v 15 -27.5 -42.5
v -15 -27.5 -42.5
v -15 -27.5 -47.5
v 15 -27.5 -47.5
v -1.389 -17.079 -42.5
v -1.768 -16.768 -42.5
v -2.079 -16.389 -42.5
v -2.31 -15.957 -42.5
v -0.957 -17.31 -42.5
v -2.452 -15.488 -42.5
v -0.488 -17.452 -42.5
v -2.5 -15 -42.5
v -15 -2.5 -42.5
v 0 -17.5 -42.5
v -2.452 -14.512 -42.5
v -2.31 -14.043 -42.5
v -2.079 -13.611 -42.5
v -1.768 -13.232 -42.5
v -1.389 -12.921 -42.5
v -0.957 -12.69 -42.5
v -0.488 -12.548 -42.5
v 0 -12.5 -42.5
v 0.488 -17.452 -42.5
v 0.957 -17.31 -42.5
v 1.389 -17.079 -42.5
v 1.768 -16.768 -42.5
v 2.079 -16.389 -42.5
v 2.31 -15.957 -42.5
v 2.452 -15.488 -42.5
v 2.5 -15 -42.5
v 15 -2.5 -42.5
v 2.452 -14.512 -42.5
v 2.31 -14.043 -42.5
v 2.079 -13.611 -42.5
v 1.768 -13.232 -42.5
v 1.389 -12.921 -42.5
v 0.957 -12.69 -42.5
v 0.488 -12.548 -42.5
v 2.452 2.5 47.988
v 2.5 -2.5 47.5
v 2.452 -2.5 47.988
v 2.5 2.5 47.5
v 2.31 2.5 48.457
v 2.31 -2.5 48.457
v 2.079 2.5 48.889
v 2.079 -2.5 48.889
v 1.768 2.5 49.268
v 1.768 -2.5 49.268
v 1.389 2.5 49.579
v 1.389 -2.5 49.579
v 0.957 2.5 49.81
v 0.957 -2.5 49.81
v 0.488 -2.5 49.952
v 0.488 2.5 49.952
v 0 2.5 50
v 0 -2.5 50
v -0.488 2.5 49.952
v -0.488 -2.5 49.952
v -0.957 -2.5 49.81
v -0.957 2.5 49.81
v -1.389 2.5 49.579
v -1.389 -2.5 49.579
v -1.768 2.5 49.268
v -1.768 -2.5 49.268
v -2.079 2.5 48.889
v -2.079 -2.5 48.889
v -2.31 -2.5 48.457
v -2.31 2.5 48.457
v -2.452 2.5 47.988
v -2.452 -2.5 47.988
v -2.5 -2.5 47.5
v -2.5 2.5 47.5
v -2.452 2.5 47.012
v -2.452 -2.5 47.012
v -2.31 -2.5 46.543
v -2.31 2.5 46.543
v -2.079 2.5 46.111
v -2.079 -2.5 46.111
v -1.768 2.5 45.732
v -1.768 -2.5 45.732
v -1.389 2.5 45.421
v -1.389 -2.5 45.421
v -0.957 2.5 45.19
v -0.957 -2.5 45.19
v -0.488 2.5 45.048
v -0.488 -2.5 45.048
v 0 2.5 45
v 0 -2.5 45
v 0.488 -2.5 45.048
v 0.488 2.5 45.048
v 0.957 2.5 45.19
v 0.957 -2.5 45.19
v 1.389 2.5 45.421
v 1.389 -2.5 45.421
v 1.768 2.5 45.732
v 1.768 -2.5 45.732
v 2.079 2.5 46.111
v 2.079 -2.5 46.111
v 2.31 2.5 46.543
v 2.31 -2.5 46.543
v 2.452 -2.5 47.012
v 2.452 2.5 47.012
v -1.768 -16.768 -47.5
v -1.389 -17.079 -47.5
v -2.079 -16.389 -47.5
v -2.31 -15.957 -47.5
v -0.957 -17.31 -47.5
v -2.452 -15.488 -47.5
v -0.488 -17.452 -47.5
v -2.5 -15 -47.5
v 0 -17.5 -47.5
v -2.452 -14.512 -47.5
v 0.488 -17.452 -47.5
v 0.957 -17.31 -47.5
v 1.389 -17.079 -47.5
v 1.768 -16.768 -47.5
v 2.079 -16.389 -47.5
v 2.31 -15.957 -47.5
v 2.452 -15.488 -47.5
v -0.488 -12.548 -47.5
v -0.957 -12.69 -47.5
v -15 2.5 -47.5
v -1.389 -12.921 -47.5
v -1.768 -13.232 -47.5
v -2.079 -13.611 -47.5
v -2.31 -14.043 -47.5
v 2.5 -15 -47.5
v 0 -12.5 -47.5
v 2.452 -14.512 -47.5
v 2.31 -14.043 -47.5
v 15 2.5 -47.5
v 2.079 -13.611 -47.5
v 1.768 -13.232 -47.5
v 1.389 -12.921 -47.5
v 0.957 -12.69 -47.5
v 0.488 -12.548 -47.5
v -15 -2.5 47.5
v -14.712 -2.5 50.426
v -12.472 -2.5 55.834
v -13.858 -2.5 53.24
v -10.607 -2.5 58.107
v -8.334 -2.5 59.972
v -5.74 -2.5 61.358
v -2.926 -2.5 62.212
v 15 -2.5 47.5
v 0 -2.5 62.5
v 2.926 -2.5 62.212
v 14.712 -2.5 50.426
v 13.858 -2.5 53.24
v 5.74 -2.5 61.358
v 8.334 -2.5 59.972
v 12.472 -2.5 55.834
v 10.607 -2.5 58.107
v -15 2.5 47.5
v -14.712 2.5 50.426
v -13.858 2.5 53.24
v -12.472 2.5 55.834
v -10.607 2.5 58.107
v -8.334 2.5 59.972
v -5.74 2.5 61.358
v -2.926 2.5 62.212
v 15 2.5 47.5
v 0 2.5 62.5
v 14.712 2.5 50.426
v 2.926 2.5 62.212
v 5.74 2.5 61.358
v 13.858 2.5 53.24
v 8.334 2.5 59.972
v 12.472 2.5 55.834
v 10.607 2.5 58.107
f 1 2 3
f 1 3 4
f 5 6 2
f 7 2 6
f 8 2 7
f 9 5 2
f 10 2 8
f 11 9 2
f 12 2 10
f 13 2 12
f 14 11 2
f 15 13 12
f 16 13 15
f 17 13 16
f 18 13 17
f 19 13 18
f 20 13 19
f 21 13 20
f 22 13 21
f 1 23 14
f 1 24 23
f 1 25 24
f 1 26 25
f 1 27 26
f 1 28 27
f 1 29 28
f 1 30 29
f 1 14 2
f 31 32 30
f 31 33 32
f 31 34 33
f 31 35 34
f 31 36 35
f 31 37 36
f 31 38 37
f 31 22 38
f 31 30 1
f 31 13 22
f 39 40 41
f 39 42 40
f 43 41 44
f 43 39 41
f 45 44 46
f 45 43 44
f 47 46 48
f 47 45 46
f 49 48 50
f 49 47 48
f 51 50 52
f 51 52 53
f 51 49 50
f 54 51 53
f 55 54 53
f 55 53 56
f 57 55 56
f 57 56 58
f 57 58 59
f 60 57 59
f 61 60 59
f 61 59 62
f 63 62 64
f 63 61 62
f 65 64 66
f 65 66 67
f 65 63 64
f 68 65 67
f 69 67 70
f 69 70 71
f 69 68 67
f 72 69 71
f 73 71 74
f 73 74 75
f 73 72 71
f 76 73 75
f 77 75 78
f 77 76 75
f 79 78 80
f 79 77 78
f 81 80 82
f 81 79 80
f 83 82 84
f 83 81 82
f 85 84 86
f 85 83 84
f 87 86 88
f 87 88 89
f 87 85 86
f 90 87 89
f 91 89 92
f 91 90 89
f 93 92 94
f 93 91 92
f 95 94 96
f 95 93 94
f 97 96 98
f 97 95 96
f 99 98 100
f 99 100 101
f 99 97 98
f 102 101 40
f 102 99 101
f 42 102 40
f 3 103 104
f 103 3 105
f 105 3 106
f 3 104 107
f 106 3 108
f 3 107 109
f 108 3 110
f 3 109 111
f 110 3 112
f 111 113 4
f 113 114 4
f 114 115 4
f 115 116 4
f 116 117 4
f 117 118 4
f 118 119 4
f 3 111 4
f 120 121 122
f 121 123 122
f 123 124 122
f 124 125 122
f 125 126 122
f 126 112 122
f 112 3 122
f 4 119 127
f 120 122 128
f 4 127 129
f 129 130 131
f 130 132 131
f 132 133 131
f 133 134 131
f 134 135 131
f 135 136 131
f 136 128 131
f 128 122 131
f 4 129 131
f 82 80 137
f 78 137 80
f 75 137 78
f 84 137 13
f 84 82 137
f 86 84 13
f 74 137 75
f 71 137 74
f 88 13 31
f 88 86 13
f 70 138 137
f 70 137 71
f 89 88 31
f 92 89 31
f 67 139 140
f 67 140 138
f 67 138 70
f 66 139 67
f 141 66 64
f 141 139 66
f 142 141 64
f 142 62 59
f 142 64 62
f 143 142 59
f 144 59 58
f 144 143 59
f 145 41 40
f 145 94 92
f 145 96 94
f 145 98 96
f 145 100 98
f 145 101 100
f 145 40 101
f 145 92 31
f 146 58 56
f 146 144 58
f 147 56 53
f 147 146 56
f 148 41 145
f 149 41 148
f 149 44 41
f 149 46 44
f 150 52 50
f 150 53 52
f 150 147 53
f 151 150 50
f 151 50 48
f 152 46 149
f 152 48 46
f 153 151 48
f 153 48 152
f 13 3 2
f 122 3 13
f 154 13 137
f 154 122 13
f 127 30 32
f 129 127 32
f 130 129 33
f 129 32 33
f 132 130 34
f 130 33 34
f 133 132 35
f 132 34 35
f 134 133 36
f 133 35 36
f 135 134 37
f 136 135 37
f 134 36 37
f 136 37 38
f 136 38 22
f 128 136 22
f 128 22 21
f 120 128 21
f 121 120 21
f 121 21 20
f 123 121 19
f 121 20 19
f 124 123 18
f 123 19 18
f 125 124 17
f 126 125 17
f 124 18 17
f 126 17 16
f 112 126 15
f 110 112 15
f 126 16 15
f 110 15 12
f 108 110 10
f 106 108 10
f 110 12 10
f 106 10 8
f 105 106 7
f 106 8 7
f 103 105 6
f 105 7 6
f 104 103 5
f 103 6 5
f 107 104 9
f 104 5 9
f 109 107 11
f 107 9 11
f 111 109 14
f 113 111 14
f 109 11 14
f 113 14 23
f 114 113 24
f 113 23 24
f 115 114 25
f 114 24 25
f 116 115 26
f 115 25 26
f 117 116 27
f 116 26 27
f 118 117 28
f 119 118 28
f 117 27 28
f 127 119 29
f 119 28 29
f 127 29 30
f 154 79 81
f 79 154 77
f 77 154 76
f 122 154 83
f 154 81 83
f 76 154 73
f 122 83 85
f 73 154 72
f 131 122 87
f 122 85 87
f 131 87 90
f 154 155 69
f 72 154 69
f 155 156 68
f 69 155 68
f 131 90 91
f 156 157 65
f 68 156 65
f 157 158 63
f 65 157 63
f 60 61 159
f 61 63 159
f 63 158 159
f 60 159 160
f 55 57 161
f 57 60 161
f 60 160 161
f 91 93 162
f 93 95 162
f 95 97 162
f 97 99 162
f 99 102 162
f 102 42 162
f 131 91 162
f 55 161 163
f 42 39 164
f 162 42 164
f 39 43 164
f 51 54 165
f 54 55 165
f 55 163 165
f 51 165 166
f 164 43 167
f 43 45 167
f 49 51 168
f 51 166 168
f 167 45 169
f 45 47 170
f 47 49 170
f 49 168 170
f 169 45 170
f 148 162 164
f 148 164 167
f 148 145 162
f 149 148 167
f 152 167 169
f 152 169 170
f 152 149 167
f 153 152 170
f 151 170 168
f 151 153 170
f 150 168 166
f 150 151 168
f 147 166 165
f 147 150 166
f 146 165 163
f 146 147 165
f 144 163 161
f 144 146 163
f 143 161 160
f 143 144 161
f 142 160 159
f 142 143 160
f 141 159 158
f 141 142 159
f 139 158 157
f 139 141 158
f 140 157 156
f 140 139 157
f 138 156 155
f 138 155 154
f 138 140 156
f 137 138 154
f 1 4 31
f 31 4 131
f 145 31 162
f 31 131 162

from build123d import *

# Parameters (mm, degrees)
F0_R     = 2.5
F1_DEPTH = 2.5
F2_W     = 30
F2_H     = 5
F3_DEPTH = 25
F4_R     = 2.5
F5_DEPTH = 5


with BuildPart() as f1:
    # F0 (on Front) → F1 (new body, symmetric)
    with BuildSketch(Plane.XZ):
        with BuildLine():
            Line((-15, 47.5), (-15, -47.5))
            Line((-15, -47.5), (15, -47.5))
            Line((15, -47.5), (15, 47.5))
            ThreePointArc((15, 47.5), (0, 62.5), (-15, 47.5))
        make_face()
        with Locations((0, 47.5)):
            Circle(F0_R, mode=Mode.SUBTRACT)
    extrude(amount=F1_DEPTH, both=True)

    # F2 (on face) → F3 (join)
    with BuildSketch(Plane.XZ.offset(2.5)):
        with Locations((0, -45)):
            Rectangle(F2_W, F2_H)
    extrude(amount=F3_DEPTH)

    # F4 (on face) → F5 (cut, through all)
    with BuildSketch(Plane.XY.offset(-42.5)):
        with Locations((0, -15)):
            Circle(F4_R)
    extrude(amount=-F5_DEPTH, mode=Mode.SUBTRACT)


solid = f1.part
